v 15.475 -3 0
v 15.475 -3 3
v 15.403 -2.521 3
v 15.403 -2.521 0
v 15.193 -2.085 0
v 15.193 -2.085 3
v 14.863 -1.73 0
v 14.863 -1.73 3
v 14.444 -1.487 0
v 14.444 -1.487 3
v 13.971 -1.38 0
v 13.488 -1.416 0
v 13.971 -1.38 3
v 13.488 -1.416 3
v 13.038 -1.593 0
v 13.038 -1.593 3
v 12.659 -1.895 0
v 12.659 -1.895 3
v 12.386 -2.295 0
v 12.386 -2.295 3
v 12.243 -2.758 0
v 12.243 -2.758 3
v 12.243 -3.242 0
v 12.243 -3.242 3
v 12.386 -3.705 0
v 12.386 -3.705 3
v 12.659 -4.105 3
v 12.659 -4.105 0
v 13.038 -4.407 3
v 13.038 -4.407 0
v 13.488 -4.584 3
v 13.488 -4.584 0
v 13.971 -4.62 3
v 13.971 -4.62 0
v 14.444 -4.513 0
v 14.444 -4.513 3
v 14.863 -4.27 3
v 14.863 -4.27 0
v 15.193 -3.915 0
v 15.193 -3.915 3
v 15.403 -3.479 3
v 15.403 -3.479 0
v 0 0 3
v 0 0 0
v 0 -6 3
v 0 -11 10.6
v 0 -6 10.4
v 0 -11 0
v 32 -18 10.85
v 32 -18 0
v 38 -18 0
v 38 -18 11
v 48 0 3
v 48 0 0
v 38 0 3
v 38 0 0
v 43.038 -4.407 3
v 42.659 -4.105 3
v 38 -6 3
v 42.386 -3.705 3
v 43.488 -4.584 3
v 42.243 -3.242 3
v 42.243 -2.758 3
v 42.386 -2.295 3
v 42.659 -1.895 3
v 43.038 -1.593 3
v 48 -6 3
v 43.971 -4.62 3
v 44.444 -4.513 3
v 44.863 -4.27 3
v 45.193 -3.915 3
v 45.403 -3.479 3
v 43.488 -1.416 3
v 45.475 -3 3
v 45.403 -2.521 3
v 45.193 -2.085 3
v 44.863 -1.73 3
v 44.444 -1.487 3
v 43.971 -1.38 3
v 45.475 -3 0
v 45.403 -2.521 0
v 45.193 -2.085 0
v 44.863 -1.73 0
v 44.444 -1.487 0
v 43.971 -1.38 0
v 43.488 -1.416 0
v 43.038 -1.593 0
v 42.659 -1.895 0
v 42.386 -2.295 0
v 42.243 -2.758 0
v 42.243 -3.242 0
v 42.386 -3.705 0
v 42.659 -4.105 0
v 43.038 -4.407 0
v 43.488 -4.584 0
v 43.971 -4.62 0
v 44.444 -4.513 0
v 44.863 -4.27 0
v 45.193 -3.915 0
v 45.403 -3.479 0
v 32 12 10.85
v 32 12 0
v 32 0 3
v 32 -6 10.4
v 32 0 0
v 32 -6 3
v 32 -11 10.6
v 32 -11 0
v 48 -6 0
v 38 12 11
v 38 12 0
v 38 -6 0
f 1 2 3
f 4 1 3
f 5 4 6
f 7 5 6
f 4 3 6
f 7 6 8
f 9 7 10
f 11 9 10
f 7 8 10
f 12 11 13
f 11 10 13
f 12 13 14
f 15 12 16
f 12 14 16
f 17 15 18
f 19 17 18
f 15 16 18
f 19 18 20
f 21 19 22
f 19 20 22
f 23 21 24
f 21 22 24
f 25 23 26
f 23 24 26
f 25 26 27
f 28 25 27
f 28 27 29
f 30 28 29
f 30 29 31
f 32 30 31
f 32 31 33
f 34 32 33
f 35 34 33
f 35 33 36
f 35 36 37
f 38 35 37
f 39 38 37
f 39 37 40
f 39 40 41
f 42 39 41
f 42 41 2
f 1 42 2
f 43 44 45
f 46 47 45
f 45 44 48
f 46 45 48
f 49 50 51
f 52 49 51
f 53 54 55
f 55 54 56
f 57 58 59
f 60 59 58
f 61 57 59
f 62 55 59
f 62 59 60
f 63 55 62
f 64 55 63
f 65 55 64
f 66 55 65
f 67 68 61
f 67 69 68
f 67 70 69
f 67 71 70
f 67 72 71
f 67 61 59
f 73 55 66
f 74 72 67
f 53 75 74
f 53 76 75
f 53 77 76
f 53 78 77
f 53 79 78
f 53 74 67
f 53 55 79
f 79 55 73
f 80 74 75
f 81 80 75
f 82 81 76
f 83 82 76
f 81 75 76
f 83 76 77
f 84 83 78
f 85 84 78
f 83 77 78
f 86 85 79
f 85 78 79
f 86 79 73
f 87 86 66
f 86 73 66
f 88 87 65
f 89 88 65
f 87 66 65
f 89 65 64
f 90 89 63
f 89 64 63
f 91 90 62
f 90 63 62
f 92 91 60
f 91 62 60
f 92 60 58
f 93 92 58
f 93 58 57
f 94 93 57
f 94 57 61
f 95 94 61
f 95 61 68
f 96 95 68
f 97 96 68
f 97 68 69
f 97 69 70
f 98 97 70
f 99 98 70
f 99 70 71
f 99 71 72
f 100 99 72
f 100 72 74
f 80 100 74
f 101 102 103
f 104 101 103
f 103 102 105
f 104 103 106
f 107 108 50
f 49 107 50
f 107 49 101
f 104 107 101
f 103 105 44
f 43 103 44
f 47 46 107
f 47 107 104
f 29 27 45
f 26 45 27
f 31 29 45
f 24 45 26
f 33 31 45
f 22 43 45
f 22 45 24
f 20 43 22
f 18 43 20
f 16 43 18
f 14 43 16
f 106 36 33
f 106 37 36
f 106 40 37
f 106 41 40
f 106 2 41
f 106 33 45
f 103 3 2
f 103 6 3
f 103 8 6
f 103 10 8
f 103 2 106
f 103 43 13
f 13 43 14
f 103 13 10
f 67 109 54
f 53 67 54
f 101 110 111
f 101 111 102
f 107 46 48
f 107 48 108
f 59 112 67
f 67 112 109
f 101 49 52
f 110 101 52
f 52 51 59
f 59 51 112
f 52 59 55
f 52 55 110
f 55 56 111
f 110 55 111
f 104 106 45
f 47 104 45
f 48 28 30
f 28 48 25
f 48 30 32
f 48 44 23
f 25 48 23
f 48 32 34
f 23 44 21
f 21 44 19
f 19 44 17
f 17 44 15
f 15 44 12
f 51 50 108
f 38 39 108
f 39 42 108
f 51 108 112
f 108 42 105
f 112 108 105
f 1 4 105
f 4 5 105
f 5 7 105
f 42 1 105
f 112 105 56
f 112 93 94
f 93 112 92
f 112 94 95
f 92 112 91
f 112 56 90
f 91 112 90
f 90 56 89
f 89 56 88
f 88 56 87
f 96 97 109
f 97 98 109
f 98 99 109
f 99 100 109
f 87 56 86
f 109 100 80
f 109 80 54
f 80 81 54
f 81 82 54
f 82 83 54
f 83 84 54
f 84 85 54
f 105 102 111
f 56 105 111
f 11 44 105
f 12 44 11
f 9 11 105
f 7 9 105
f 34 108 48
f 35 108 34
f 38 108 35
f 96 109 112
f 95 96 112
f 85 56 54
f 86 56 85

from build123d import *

# Parameters (mm, degrees)
BOSS_EXTRU_1_DEPTH      = 3
ESQUISSE2_R             = 1.625
ENL_V_MAT_EXTRU_1_DEPTH = 4
BOSS_EXTRU_2_DEPTH      = 10
BOSS_EXTRU_2_DEPTH_BACK = 3
ENL_V_MAT_EXTRU_2_DEPTH = 32
ESQUISSE7_W             = 6
ESQUISSE7_H             = 30
ENL_V_MAT_EXTRU_4_DEPTH = 2
ENL_V_MAT_EXTRU_5_DEPTH = 30


with BuildPart() as part:
    # Esquisse1 → Boss.-Extru.1 (new body)
    with BuildSketch(Plane.XY):
        Polygon((32, -6), (32, -18), (38, -18), (38, -6), (48, -6), (48, 0), (38, 0), (38, 12), (32, 12), (32, 0), (0, 0), (0, -6), align=None)
    extrude(amount=BOSS_EXTRU_1_DEPTH)

    # Esquisse2 → Enlèv. mat.-Extru.1 (cut, through all)
    with BuildSketch(Plane.XY.offset(3)):
        with Locations((13.85, -3)):
            Circle(ESQUISSE2_R)
        with Locations((43.85, -3)):
            Circle(ESQUISSE2_R)
    extrude(amount=-ENL_V_MAT_EXTRU_1_DEPTH, mode=Mode.SUBTRACT)

    # Esquisse3 → Boss.-Extru.2 (add, two sides)
    with BuildSketch(Plane.XY.offset(3)) as boss_extru_2_sk:
        Polygon((38, 12), (32, 12), (32, -6), (0, -6), (0, -11), (32, -11), (32, -18), (38, -18), align=None)
    extrude(amount=BOSS_EXTRU_2_DEPTH)
    extrude(boss_extru_2_sk.sketch, amount=-BOSS_EXTRU_2_DEPTH_BACK)

    # Esquisse4 → Enlèv. mat.-Extru.2 (cut)
    with BuildSketch(Plane.ZY):
        Polygon((13, -6), (13, -11), (10.6, -11), (10.4, -6), align=None)
    extrude(amount=-ENL_V_MAT_EXTRU_2_DEPTH, mode=Mode.SUBTRACT)

    # Esquisse7 → Enlèv. mat.-Extru.4 (cut)
    with BuildSketch(Plane.XY.offset(13)):
        with Locations((35, -3)):
            Rectangle(ESQUISSE7_W, ESQUISSE7_H)
    extrude(amount=-ENL_V_MAT_EXTRU_4_DEPTH, mode=Mode.SUBTRACT)

    # Esquisse8 → Enlèv. mat.-Extru.5 (cut)
    with BuildSketch(Plane.XZ.offset(18)):
        Polygon((32, 11), (32, 10.85), (38, 11), align=None)
    extrude(amount=-ENL_V_MAT_EXTRU_5_DEPTH, mode=Mode.SUBTRACT)


solid = part.part
